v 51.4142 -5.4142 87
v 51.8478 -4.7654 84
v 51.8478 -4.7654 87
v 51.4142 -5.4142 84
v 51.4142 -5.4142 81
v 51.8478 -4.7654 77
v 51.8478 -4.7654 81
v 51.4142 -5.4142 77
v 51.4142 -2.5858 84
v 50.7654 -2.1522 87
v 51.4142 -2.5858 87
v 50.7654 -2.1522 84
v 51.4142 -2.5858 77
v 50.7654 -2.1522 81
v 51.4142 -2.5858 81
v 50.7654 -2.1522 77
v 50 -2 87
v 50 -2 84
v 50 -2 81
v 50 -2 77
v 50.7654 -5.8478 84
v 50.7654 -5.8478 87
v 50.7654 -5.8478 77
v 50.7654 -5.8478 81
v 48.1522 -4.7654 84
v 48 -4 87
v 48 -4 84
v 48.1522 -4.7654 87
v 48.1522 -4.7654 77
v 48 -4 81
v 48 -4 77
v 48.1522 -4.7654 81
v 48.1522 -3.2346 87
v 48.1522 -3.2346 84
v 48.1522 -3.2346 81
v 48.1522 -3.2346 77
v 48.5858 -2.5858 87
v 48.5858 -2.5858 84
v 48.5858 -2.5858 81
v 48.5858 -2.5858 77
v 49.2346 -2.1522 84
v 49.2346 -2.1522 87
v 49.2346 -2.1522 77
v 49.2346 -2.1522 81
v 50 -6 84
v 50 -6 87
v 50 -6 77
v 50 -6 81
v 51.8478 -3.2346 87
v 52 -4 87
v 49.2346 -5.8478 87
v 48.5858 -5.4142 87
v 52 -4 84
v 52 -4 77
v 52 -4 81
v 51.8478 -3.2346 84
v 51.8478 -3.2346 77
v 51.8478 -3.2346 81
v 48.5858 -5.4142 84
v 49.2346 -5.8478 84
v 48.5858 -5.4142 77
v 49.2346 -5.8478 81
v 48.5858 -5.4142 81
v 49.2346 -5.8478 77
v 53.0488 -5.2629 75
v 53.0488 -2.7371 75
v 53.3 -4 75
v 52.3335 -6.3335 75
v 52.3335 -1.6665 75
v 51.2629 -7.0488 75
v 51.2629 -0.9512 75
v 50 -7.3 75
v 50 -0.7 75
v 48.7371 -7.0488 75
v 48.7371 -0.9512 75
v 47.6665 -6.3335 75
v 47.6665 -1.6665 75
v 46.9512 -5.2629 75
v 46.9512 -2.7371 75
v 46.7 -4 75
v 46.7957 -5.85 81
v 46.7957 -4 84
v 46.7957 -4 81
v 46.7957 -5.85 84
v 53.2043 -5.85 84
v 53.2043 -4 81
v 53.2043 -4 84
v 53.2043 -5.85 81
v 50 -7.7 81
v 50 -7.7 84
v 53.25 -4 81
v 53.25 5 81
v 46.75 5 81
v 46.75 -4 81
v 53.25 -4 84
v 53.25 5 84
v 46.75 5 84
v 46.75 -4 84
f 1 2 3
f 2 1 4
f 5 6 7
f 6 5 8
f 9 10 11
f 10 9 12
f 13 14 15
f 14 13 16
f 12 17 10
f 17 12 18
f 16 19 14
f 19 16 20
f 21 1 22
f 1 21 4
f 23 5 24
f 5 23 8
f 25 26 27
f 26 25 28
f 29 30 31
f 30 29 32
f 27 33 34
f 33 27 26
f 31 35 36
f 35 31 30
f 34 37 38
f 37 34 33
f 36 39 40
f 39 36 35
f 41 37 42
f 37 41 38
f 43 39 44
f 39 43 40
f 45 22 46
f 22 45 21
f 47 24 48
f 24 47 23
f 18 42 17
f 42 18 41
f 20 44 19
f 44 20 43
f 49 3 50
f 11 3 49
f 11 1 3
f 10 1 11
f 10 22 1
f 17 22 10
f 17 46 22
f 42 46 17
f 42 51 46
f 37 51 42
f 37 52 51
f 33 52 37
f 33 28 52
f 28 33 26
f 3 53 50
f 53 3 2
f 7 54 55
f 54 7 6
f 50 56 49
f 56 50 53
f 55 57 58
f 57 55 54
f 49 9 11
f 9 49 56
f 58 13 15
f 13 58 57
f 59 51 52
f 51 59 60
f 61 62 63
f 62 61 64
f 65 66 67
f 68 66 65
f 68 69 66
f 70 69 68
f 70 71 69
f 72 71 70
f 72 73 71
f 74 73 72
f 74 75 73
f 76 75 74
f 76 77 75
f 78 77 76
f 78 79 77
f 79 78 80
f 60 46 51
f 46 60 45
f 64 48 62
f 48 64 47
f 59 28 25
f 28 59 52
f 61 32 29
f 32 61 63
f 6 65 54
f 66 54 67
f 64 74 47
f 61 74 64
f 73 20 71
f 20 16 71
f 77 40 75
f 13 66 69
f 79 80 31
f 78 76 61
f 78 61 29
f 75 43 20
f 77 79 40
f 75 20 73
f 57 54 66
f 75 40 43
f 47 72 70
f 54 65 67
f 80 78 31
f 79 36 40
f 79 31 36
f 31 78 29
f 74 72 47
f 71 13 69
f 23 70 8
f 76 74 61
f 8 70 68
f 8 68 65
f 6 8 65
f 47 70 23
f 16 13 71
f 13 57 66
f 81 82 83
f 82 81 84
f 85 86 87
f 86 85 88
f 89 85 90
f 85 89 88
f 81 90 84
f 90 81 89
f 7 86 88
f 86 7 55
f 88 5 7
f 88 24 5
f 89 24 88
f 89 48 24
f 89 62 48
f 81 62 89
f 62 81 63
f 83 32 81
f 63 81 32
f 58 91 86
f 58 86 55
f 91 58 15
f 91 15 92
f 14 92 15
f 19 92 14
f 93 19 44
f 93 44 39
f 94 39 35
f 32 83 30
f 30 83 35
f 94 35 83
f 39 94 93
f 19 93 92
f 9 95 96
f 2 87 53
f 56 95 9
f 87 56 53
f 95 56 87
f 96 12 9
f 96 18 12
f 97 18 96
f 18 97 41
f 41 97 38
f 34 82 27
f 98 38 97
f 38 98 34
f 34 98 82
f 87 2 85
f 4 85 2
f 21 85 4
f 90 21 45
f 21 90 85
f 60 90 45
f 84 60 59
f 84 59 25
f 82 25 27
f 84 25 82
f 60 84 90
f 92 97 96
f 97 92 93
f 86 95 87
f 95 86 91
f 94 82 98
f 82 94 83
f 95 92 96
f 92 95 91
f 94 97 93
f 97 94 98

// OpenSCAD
// file: library/dinrail_holder.scad
// din holder
include <dinrail_dim.scad> 
include <linurs_screw_dim.scad>
include <dinrail_holder_dim.scad>

use <dinrail.scad>
use <linurs_screw.scad>
use <linurs_body.scad>

module dinrail_screw(dinholder_x=100,t=0){
    for(x=[-1,1]){ 
        for(y=[-1,1]){
          translate([x*(dinholder_x+dinrail_w1)/4,
                     y*(dinholder_y-dinrail_lever_w)/2,
                     dinholder_bracket_z+dinrail_h-dinrail_screw_l/2])
          screw_fix(w=dinrail_screw_l+0.01,
                    d=dinrail_screw,
                    type=head_cnt,
                    raise=dinrail_h/2,
                    t=t);//dinholder_pass);
        }
    }// holes
    
}    
//dinrail_screw();


module dinrail_bracket(dinholder_x=100){
  echo("dinrail bracket");  
  difference(){
    translate([0,0,dinholder_bracket_z/2+dinrail_h])
    cube([dinholder_x,dinholder_y,dinholder_bracket_z],center=true);
    dinrail_screw(dinholder_x=dinholder_x,t=dinholder_pass);
  }
}
//%dinrail_bracket();

module dinrail_holder(dinholder_x=100){
  echo("dinrail holder");
  difference(){
      translate([-(dinrail_w1+dinholder_x)/4,
                 0,
                 dinrail_h-(dinholder_lever_cover+dinholder_z)/2])
      cube([(dinholder_x-dinrail_w1)/2,
             dinholder_y,
             dinholder_z+dinholder_lever_cover],
           center=true);  // main body
      dinrail_screw(dinholder_x=dinholder_x,t=dinholder_pass);
  }
  
  translate([-dinrail_w1/2,
             -dinholder_y/2,
             dinrail_h])
  rotate([0,90,90])
  linear_extrude(height=dinholder_y){
        polygon(
        points=[[dinrail_t, 0+olp],
                [dinrail_g+dinrail_t,-dinrail_g],
                [dinholder_z+dinholder_lever_cover,-dinrail_g],
                [dinholder_z+dinholder_lever_cover,0+olp],
               ], 
        paths=[[0,1,2,3]]
        ); 
  }// wedge 
}
//%dinrail_holder();

module dinrail_lever_holder(dinholder_x=100,s=2){
    echo("dinrail lever holder"); 
    difference(){
    translate([(dinrail_w1+dinholder_x)/4+dinrail_g/2,
                0,
                dinrail_h-(dinholder_z+dinholder_lever_cover)/2])
    cube([(dinholder_x-dinrail_w1)/2-dinrail_g,
           dinholder_y,
           dinholder_z+dinholder_lever_cover],
           center=true);  // main body

    translate([(dinrail_w1+dinholder_x)/4+(dinrail_g-s)/2,
                0,
                dinrail_h-(dinrail_lever_h+dinholder_pass)/2])
    cube([(dinholder_x-dinrail_w1)/2-dinrail_g-s,
           dinholder_y-2*dinholder_lever_wall+dinholder_pass,
           dinrail_lever_h+dinholder_pass+olp],center=true); // lever cut out   
       
    translate([dinholder_x/2-2*s,
                0,
                dinrail_h-(dinrail_lever_h+dinholder_pass)/2])
    cube([s+dinholder_pass,
           dinholder_y+olp,
           dinrail_lever_h+dinholder_pass+olp],
         center=true); // spring fixation cut  

    dinrail_screw(dinholder_x=dinholder_x,t=dinholder_pass); 
  }
}
//%dinrail_lever_holder();

// s strengt of spring
// t pre-tension of spring
// n number of windings
module dinrail_lever(dinholder_x=100, s=2, t=0, n=2){
    echo("dinrail lever");
     translate([dinrail_w1/2-t,
               dinrail_lever_w/2,
               dinrail_h-dinrail_lever_h  + dinrail_lever_h- dinrail_t])
    rotate([90,0,0])
    linear_extrude(height=dinrail_lever_w){
        polygon(
        points=[[0-olp,                   0                        ],
                [0-olp,                   (dinrail_t-dinrail_lever_h) ],
                [-dinrail_lever_wedge,    0                        ],
             ], 
        paths=[[0,1,2]]
        );
    }// wedge
    
    translate([dinrail_w1/2+s-dinrail_g-t,
               -dinrail_lever_w/2,
               dinrail_h-dinrail_lever_h])
    cube([dinrail_g+t+olp,dinrail_lever_w,dinrail_lever_h]);  // tension an gap cube

    translate([dinrail_w1/2+s,
               dinrail_lever_w/2,
               dinrail_h-dinrail_lever_h])
    rotate([0,0,-90])
    spring(d=[dinrail_lever_w,
              (dinholder_x-dinrail_w1)/2-2.5*s,
              dinrail_lever_h],
              s=s,n=n); // spring
    
    for(i=[-1,1]){
        translate([dinholder_x/2-2*s,
                   i*(dinholder_y-dinholder_lever_wall)/2,
                   dinrail_h-dinrail_lever_h/2])
        cube([s,dinholder_lever_wall,dinrail_lever_h],center=true);
    }// hold back the spring  
}
//dinrail_lever();

//
dinholder_x=110;
s=2;
t=2;
n=3;
// to print
//%
dinrail_bracket(dinholder_x=dinholder_x);
//rotate([180,0,0])
//%
dinrail_holder(dinholder_x=dinholder_x);
//%
dinrail_lever(dinholder_x=dinholder_x, s=s, n=n, t=t);
//%
dinrail_lever_holder(dinholder_x=dinholder_x,s=s);
//%
dinrail();
// file: library/dinrail.scad
// din rail

include <dinrail_dim.scad>
use <linurs_body.scad>

module dinrail(l=100)
{   
  translate([0,0,dinrail_t/2])
    cube([dinrail_w2-2*dinrail_r-2*dinrail_t,
          l,
          dinrail_t],center=true);
          
  for(i=[-1,1]){
    translate([i*(dinrail_w2-dinrail_t)/2,
               0,
               dinrail_h/2])
      cube([dinrail_t,l,dinrail_h-2*dinrail_r-2*dinrail_t],
           center=true);  
      
    translate([i*(dinrail_w2/2+(dinrail_w1-dinrail_w2)/4+dinrail_r/2),
               0,
               dinrail_h-dinrail_t/2])
      cube([(dinrail_w1-dinrail_w2)/2-dinrail_r,l,dinrail_t],
           center=true);
      
    translate([i*(-dinrail_w2/2+dinrail_r+dinrail_t),
               0,
               dinrail_r+dinrail_t])
      rotate([90,90+i*45,0])  
      channel(d1=dinrail_r*2,d2=(dinrail_r+dinrail_t)*2,h=l,a=90);  
      
    translate([i*(-dinrail_w2/2-dinrail_r),
               0,
               dinrail_h-dinrail_r-dinrail_t])
      rotate([90,-90+i*45,0])  
      channel(d1=dinrail_r*2,d2=(dinrail_r+dinrail_t)*2,h=l,a=90);       
  }
}

dinrail();
// file: pcbmodule/connector.scad
// connector
// Connector to be mounted on pcb of the modules
// This module is not intended to be 3D printed
include <pcbmodule_dim.scad>
include <../motherboard/motherboard_dim.scad>

use <pcb.scad>

con_w=87.5;   // width of connector bodywithout flanges of mounting holes 
con_d=2.8;    // diameter of mounting holes
con_d_w=88.9; // distance between mounting holes
con_m_h=6;    // height of mounting cube
con_h=13;     // largest z dimension

module connector(){
  echo("pcb connector");
  color("LightGrey")
  difference(){
    translate([(motherboard_w-con_w)/2,0,-pcbmodule_con_out]) // bring in position of elecbox
    union(){
      cube([con_w,motherboard_con_t,con_h]); // main body of the connector
      for(x=[(con_w-con_d_w)/2,con_w+(con_d_w-con_w)/2]){ // add the two brackets
        translate([x,con_m_h/2+pcb_thick,10.2])
        difference(){
          cube([2*con_d,con_m_h,2*con_d],center=true);  // bracket main body
          rotate([90,0,0])
          cylinder(d=con_d, h=con_h, $fn=16, center=true); // hole in brackets
        }
      }
    }
    translate([0,-olp,0])cube([motherboard_w,motherboard_t+olp,2*con_d]); // remove material to create edge of pcb
  }
}
connector();

//
pcb();
// file: pcbmodule/pcb.scad
// pcb
// pcb of the module
// This module is not intended to be 3D printed

include <../motherboard/motherboard_dim.scad>
include <pcbmodule_dim.scad>


module pcb(){
  echo("pcb");  
  color("greenyellow")
  difference(){
    cube([motherboard_w,pcb_thick,pcb_h]); // pcb
    for(x=[pcb_x1,pcb_x2]){ // mounting holes
      for(y=[pcb_y1,pcb_y2]){
        translate([x,0,y])
        rotate([90,0,0])
        cylinder(d=pcb_d,h=3*pcb_thick,center=true,$fn=16);
      }
    }
  }
}

//
pcb();
// file: pcbmodule/bracket.scad
// bracket
// A bracket of the elecbox module
// - type: 0 front bracket, 1 rear bracket
// - width 1..n in steps
// - var: 0 do not create intermediate mounting holes, 1 create intermediate mounting holes 

include <pcbmodule_dim.scad>
include <../motherboard/motherboard_dim.scad>
include <../library/linurs_screw_dim.scad>

use <../library/linurs_screw.scad>


module bracket(type=0, width=1, var=0){
  echo("bracket");  
  color("White")
  translate([type*motherboard_w,
             0,
             0])  // move mirrored bracket in position if desired
  mirror([type*1,0,0])       // mirror it if desired
  difference(){
    union(){
      for(x=[1:width]){  // create the mounting hole cubes 
        for(z=[pcb_y1,pcb_y2]){
          translate([pcb_x1,
                     (x-1)*step*var-bracket_hole_cube_h/2,
                     z])
          cube([bracket_x1-bracket_t,bracket_hole_cube_h,3*screw_d[bracket_screw]],center=true);
        }
      }

      translate([bracket_t/2+bracket_offset_x,
                 step/2*width-bracket_hole_cube_h,
                 bracket_h/2+bracket_offset_z])  
      cube([bracket_t,step*width,bracket_h],center=true);  // create the bracket front


      translate([bracket_x1/2+bracket_offset_x,
                 bracket_t/2-bracket_hole_cube_h,
                 bracket_h/2+bracket_offset_z]) 
      cube([bracket_x1,bracket_t,bracket_h],center=true);  // create the bracket mounting


      translate([bracket_x2/2+bracket_offset_x,
                 bracket_t/2-bracket_hole_cube_h+step*width-bracket_t,
                 bracket_h/2+bracket_offset_z]) 
      cube([bracket_x2,bracket_t,bracket_h],center=true);  // create the bracket mounting


    }
    for(x=[1:width]){ // create the mounting hole 
      for(z=[pcb_y1,pcb_y2]){
        translate([pcb_x1,
                   (x-1)*step*var-olp,
                   z])
        rotate([0,90,0])
        rotate([-90,0,0])
        screw_fix(w=2*bracket_hole_cube_h,d=bracket_screw,type=head_no, t=screw_t);
      }
    }
  }
}

// to show
//bracket(type=1, width=2, var=1);
//
bracket();
bracket(type=1);
//

// to print
//rotate([0,-90,0])bracket(type=0);
//rotate([0,90,0]) bracket(type=1);
//bracket(type=0);

module arduino(){
    difference(){
        bracket(type=0);
        translate([0,1+12/2,52.5+13/2])cube([20,12,13],center=true);
        translate([0,1+12/2,24+10/2])cube([20,12,10],center=true);
        translate([0,1+12+2/2,21.5+54/2])cube([20,2,54],center=true);
    }
}
//rotate([0,-90,0])
//arduino();

module 3DprinterIOfront(){
    difference(){
        bracket(type=0);
        translate([0,11/2,37.5+34/2])cube([20,11,34],center=true);        
    }
}
//rotate([0,-90,0])
//3DprinterIOfront();

module 3DprinterIOback(){
    difference(){
        translate([-100,0,0])bracket(type=1);
        translate([0,14/2,12+31/2])cube([20,14,31],center=true); 
        translate([0,14/2,53.5+18.5/2])cube([20,14,18.5],center=true);               
    }
}
//rotate([0,90,0])
//3DprinterIOback();

module Fetback(){
    difference(){
        translate([-100,0,0])bracket(type=1);
        translate([0,14/2,15+51/2])cube([20,14,51],center=true); 
       
    }
}
//rotate([0,90,0])
//Fetback();

module Stepperback(){
    difference(){
        translate([-100,0,0])bracket(type=1);
        translate([0,14/2,15+14/2])cube([20,14,14],center=true); 
        translate([0,14/2,30+14/2])cube([20,14,14],center=true); 
        translate([0,14/2,45+14/2])cube([20,14,14],center=true); 
        translate([0,14/2,60+14/2])cube([20,14,8],center=true); 
            
    }
}
//rotate([0,90,0])
//Stepperback();

module Stepperfront(){
    difference(){
        bracket(type=0);
        translate([0,14/2,15+14/2])cube([20,14,14],center=true); 
        translate([0,14/2,30+14/2])cube([20,14,14],center=true);    
       translate([0,14/2,60+14/2])cube([20,14,8],center=true);      
    }
}
//rotate([0,-90,0])
//Stepperfront();

module I2Cback(){
    difference(){
        translate([-100,0,0])bracket(type=1);
        translate([0,12/2,31+13/2])cube([20,12,13],center=true);       
    }
}
//rotate([0,90,0])
//I2Cback();

module I2Cfront(){
    difference(){
        bracket(type=0);
        translate([0,13/2,21+25/2])cube([20,13,25],center=true); 
        translate([0,5,49])rotate([0,90,0])cylinder(h=20,d=5.5,center=true, $fn=16);    
        translate([0,5,57])rotate([0,90,0])cylinder(h=20,d=5.5,center=true, $fn=16);      
    }
}
//rotate([0,-90,0])
//I2Cfront();

module MCP2221back(){
    h=12;
    w=13;
    z=31;
    difference(){
        translate([-100,0,0])bracket(type=1);
        translate([0,h/2+pcb_thick,z+w/2])cube([20,h,w],center=true);       
    }
}
//rotate([0,90,0])
//MCP2221back();

module MCP2221front(){
    h1=12;
    w1=12;
    z1=29;
    d2=4;
    h2=3;
    z2=66;
    difference(){
        bracket(type=0);
        translate([0,h1/2+pcb_thick,z1+w1/2])cube([20,h1,w1],center=true); 
        translate([0,h2+pcb_thick,z2])rotate([0,90,0])cylinder(h=20,d=d2,center=true, $fn=16);          
    }
}
//rotate([0,-90,0])
//MCP2221front();
// file: library/dinrail_dim.scad
// din rail
dinrail_w1=35;
dinrail_w2=27;
dinrail_h=7.3;
dinrail_t=1;
dinrail_r=0.5; // inner bending radius
// file: dinrail/dinrail_elecx.scad
// din rail holder for elecx 
// to check how the components interfere

include <../elecx_dim.scad>
include <../library/dinrail_dim.scad>
include <../motherboard/motherboard_dim.scad>
include <../foot/foot_dim.scad>
include <../library/dinrail_holder_dim.scad>

use <../library/dinrail.scad>
use <../library/dinrail_holder.scad>

module dinrail_elecx_single(type=0){
  if(type==0){
      dinrail_lever_l=motherboard_w-2*bracket_offset_x+2*foot_side_wall_t;
      dinrail_lever(l=dinrail_lever_l);
      dinrail_holder(l=din_bracket_l);
      dinrail_lever_holder(l=din_bracket_l);
  }else{    
    dinrail_screw(dinholder_x=dinholder_x,t=dinholder_pass);  
  }
}

module dinrail_elecx(n=1, type=0){
  if(n<din_two_holder){
  translate([50,
             (foot_min_y+(n-1)*step)/2+foot_offset_y,
             foot_offset_z-dinrail_h
            ])
  dinrail_elecx_single(type=type);
  }else{
    for(y=[foot_offset_y+dinholder_y,
           foot_min_y+(n-1)*step+foot_offset_y-dinholder_y,])  
      translate([50,
             y,
             foot_offset_z-dinrail_h
            ])
            dinrail_elecx_single(type=type);
  }
}

n=4;
//dinrail_elecx(n=n, type=1);
//
dinrail_elecx(n=n, type=0);
//foot(n=n, type=2);
//translate([50,
//             (foot_min_y+(n-1)*step)/2+foot_offset_y,
//             foot_offset_z-dinrail_h])
//dinrail(l=100+step*(n-1));
// file: pcbmodule/pcbmodule.scad
// module (pcb assembly)
// A series of assembled modules
// This module is not intended to be 3D printed
include <../motherboard/motherboard_dim.scad>

use <bracket.scad>
use <pcb.scad>
use <connector.scad>

module pcbmodule(n=1){
  for(i=[1:n]){
    translate([0,(i-1)*step,0]){
      pcb();
      connector();
      bracket();
      bracket(type=1);
    }
  }
}


//pcbmodule(n=1);
connector();
// file: library/linurs_body.scad
// linurs body
// body lets create mode advanced bodies as the standard ones from OpenSCAD as cube cylinder sphere and polyhedron

module prism(face=[[0,0],[1,0],[0,1]], h=1, center=false){  
  linear_extrude(height = h, center = center)
  polygon(points = [ face[0], face[1], face[2]], paths = [ [0, 1, 2]]);   
}
//prism();

module roundcube(size=[1,1,1], r=0.1, center=false, $fn=8){
  t = center==true ? 0 : 1; 
  translate([size[0]/2*t,size[1]/2*t,size[2]/2*t])
  union(){
    cube(size=[size[0],size[1]-2*r,size[2]-2*r],center=true);
    cube(size=[size[0]-2*r,size[1],size[2]-2*r],center=true);
    cube(size=[size[0]-2*r,size[1]-2*r,size[2]],center=true);

    for(x=[-size[0]/2+r,size[0]/2-r]){
      for(y=[-size[1]/2+r,size[1]/2-r]){
        translate([x,y,0])
          cylinder(r=r,h=size[2]-2*r, center=true,$fn=$fn);   
      }
    }

    for(x=[-size[0]/2+r,size[0]/2-r]){
      for(z=[-size[2]/2+r,size[2]/2-r]){
        translate([x,0,z])
          rotate([90,0,0])
          cylinder(r=r,h=size[1]-2*r, center=true,$fn=$fn);   
      }
    }


    for(y=[-size[1]/2+r,size[1]/2-r]){
      for(z=[-size[2]/2+r,size[2]/2-r]){
        translate([0,y,z])
          rotate([0,90,0])
          cylinder(r=r,h=size[0]-2*r, center=true,$fn=$fn);   
      }
    }

    for(x=[-size[0]/2+r,size[0]/2-r]){
      for(y=[-size[1]/2+r,size[1]/2-r]){
        for(z=[-size[2]/2+r,size[2]/2-r]){
          translate([x,y,z])
            sphere(r=r, center=true,$fn=$fn);   
        }
      }
    }
  }
}

module channel(d1=1,d2=3,h=10,a=90, center=false, $fn=32){
   intersection(){     
            difference(){
                cylinder(d=d2,h=h,center=true,$fn=$fn);
                cylinder(d=d1,h=2*h,center=true,$fn=$fn);      
            }
            if((a<180)&&(a>0)){
               t=0.5*d2*tan(a/2); 
               linear_extrude(height=2*h, center = true){
                   polygon(points=[
                                  [0,0],
                                  [d2/2,t],
                                  [d2/2,-t]
                                  ], paths=[[0,1,2]]);       
                }
            }    
            else if(a==180){
               translate([0,d2/2,0])cube([d2/2,d2,2*h]); 
            }    
   }
}

module springelement(x=0, y=0, t=1, s=2, x1=0, y1=0, a=0, l=10, m=0, e=0){
    h=1.5*s/tan(a);
    mirror([m,0,0])translate([-x,y,0]){
        rotate([0,0,180])channel(d1=2,
                d2=3*s,
                h=t,
                a=180-2*a);
        if(e==0){
                translate([x1,y1,-t/2])rotate([0,0,a])cube([l,s,t]);
        }        
    }
}    


module spring(s=2,d=[10,10,1],n=2){
//x center x
//y center y
//z tickness    
//s width of spring rods
    r1=s/2;
    r2=1.5*s;
    
    xi=d.x-3*s; // inner x circle center x
    yi=(d.y-3*s)/n/2;     // inner x circle center x
         
    c=sqrt(pow(xi,2)+pow(yi,2)); // distance between center
    c1=c/(1+r2/r1); // where spring rod cuts line between the two circle centers
    l1=sqrt(pow(c1,2)-pow(r1,2));    
    c2=c-c1;
    l2=sqrt(pow(c2,2)-pow(r2,2));
    l=l1+l2;
    a1=atan(yi/xi);
    a2=acos(r1/c1);
    a3=180-a2-a1;
    a4=90-a3;
    x1=-r1*cos(a3);
    y1=r1*sin(a3);
    
 
    translate([1.5*s,1.5*s,d.z/2]){
    for(i=[0:n-1]){
           springelement(x=0,y=i*yi*2,s=s,t=d.z, x1=x1, y1=y1, a=a4, l=l, m=0);        
    }
    for(i=[0:n-1]){
           springelement(x=xi,y=(2*i+1)*yi,s=s, t=d.z, x1=x1, y1=y1, a=a4, l=l, m=1);        
    }
    springelement(x=0,y=d.y-3*s,s=s,t=d.z, x1=x1, y1=y1, a=a4, l=l, m=0, e=1);
    }
    for(i=[0,1]){
      translate([0,i*d.y,0])mirror([0,i,0])difference(){
          cube([d.x,1.5*s,d.z]);
          translate([1.5*s,1.5*s,0])cylinder(d=s,h=3*d.z,center=true,$fn=32);
      } 
    }    
}



//
roundcube(size=[1,2,3],center=true, $fn=16);
//
translate([0,5,0])prism(h=10,center=true);
//
translate([0,10,0])channel();
//
translate([0,15,0]) spring(d=[10,30,4],n=2, s=2);
// file: library/dinrail_holder_dim.scad
// din holder
include <dinrail_dim.scad> 
include <linurs_screw_dim.scad>

// dimension for the din holder
dinholder_x=110;  // x dimension of the assembled din holder
dinholder_y=26;   // y dimension of the assembled din holder
dinholder_z=3;    // z dimension when bracket is not used
dinholder_bracket_z=dinholder_z; // z dimension of the bracket
dinrail_screw=M3; // the screws to fit it together
dinrail_screw_l=8; // lenght of the screws to fit it together

olp=0.1; // small distance used to overlap and make difference() look nice and fix mainfold errors
dinholder_pass=0.5; // gap to fit well together

// lever
dinrail_lever_w=10;
dinrail_lever_wedge=2; // overlap of wedge
dinholder_lever_wall=(dinholder_y-dinrail_lever_w)/2; // y dimension wall of lever  
dinholder_lever_cover=3;

// lever holder
dinrail_g=2; // gap to make holder larger than din rail to slide it onto the rail
dinrail_lever_h=4;
// file: elecx_dim.scad
// elecx
// The coordinate systems [0.0.0] point is the first PCB's lower right corner at the soldering side

include <library/linurs_screw_dim.scad>
include <motherboard/motherboard_dim.scad>
include <pcbmodule/pcbmodule_dim.scad>
include <wall/wall_dim.scad>

// branding text
branding="ELECX"; // As hole printable name


din_bracket_l=80;
din_two_holder=4;

// constants to look nicely and fit well together
pass_t=0.5;  //mm added so one body slides well into other
// file: motherboard/motherboard_connector.scad
// motherboard
// Connector to be mounted on the motherboard pcb
// This module is not intended to be 3D printed
// set type to 1 to get dummy conector

include <motherboard_dim.scad>
include <../library/linurs_screw_dim.scad>
use <../library/linurs_screw.scad>

module motherboard_con(type=0){
  color("LightGrey")
  difference(){
    union(){
      if(type==0){  
        cube([motherboard_con_head_w,
              motherboard_con_head_d,
              motherboard_con_h],
              center=true);  // upper body of the connector down to motherboard level
      }    
      translate([0,0,-(motherboard_con_h-motherboard_con_out)/2])
        cube([motherboard_con_w,
              motherboard_con_t,
              motherboard_con_out],
              center=true); // lower body of the connector laying on mother board
    }
    for(i=[-1,1]){ // mounting holes
      translate([i*motherboard_con_d_w/2,
                 0,
                 -(motherboard_con_h-motherboard_con_out)/2])
      screw(w=motherboard_con_out+0.1, d=M2_5, type=head_cyl, t=1);
    }
  }
}

//motherboard_con();
//
motherboard_con(type=1);
// file: wall/wall_dim.scad
include <../library/linurs_screw_dim.scad>
include <../motherboard/motherboard_dim.scad>

// wall constants
wall_t=1;        // wall thickness

wall_y=5;        // wall outside thickness
wall_fix_y=9;    // thickness of the wall fix cube
wall_gap_x=motherboard_w-2*wall_fix_y; // remove material between both wall fixation cubes
wall_head_fix_h=5; // height of the head fixing cube
wall_screw=M3;
wall_screw_t=0.8;// gap added for screws

wall_d_w=76;     // distance between wall fixation screws
wall_d_y=(wall_fix_y-wall_t)/2; // y position of the wall fixation screws
// file: pcbmodule/pcbmodule_dim.scad
include <../library/linurs_screw_dim.scad>
include <../motherboard/motherboard_dim.scad>
// pcb constants
pcb_h=80;              // height of the pcb
pcb_thick=1.6;         // thickness
pcb_x1=3;              // position mounting holes
pcb_x2=97;
pcb_y1=9;
pcb_y2=76;
pcb_d=3;               // diameter of holes

// bracket constants
bracket_t=2;           // thickness of bracket
bracket_x1=10;         // depth of the U shape at the side of the screw
bracket_x2=4;          // depth of the U shape at the side where no screw is  
bracket_h=pcb_h+15;    // height of bracket
bracket_hole_cube_h=4; // height of the mounting hole cube
bracket_screw=M2_5;    // hole for the screw

// bracket offsets
bracket_offset_x=-3;   // bracket offset in elecbox x axis (adding gap)
bracket_offset_z=-10;  // bracket offset in elecbox z axis

// pcb module dimensions
pcbmodule_w=(-bracket_offset_x)*2+motherboard_w; // depth of the module
pcbmodule_h=bracket_h;                           // hight of the module   
pcbmodule_l=step;                                // width of the module   

screw_t=1; //mm added so screws fit into holes
olp=0.1; // overlapp distance to produce nice body after difference() 
// file: head/head.scad
//head
// the head of the elecx

include <../elecx_dim.scad>
include <../library/linurs_screw_dim.scad>
include <../motherboard/motherboard_dim.scad>
include <../foot/foot_dim.scad>
include <head_dim.scad>

use <../library/linurs_body.scad>
use <../library/linurs_screw.scad>
use <../elecx_screw.scad>
use <../wall/wall.scad>

head_bracket_x=30;
head_bracket_undercut_z=2;
head_vent_x=1.5;
head_vent_y=2;
head_vent_n=5;
head_vent_start1=(motherboard_w-2*bracket_offset_x)/2+bracket_offset_x-head_bracket_x-head_groove_access_x/2;
head_vent_stop1=(motherboard_w-head_groove_access_x)/2-head_vent_x;
head_vent_start2=(motherboard_w+head_groove_access_x)/2;
head_vent_stop2=(motherboard_w-2*bracket_offset_x)/2+bracket_offset_x+head_groove_access_x/2+head_bracket_x-head_vent_x;
head_brand_y=1;
head_undercut_x=(motherboard_w-2*bracket_offset_x-head_groove_access_x-2*head_bracket_x)/2;

module head(n=1,vent=0, brand=0){
    echo("headnew");
    head_y=foot_min_y+(n-1)*step;
    difference(){
        translate([foot_offset_x,
                   foot_offset_y,
                   pcb_h+head_z]) 
        union(){// adding material
            translate([-pass_t,-pass_t,0])
            cube([foot_x+2*pass_t,
                  head_y+2*pass_t,
                  head_t]);  // head top
            
            for(i=[-pass_t,head_y-foot_side_wall_t+pass_t]){
                        translate([-pass_t,i,-head_z])
                        cube([foot_x+2*pass_t,
                              foot_side_wall_t,
                              head_z]); // y side walls
            }
                    
            foot_x_offset_wall=foot_x-foot_side_wall_t;
            for(i=[-pass_t,foot_x_offset_wall+pass_t]){
                        translate([i,-pass_t,-head_z])
                        cube([foot_side_wall_t,
                              head_y+2*pass_t,
                              head_z]); // x side walls
            }     
    
            for(i=[foot_side_wall_t,
                   foot_min_y+(n-1)*step-wall_t-foot_side_wall_t]){ 
                translate([foot_side_wall_t,
                           i-pass_t/2,
                           -head_side_wall_stand])
                cube([motherboard_w-2*bracket_offset_x+2*olp+pass_t,
                      wall_t+pass_t,
                      head_side_wall_stand]);// side wall stand
            }
            
            head_bracket_stand=head_z-(bracket_h-pcb_h+bracket_offset_z);            
            for(i=[foot_side_wall_t,
                    motherboard_w-2*bracket_offset_x-foot_side_wall_t]){
                translate([i-pass_t/2,
                           foot_side_wall_t,
                           -head_bracket_stand])                
                        
                cube([bracket_t+olp+pass_t,
                      2*wall_y+n*step+pass_t,
                      head_bracket_stand]);  // bracket stand
            }
            
            for(i=[0,
                   head_y-wall_fix_y-wall_t-foot_side_wall_t]){
                translate([(foot_x-head_groove_access_x)/2,
                           i,
                           -head_bracket_stand])                
                        
                cube([head_groove_access_x,
                      wall_fix_y+wall_t+foot_side_wall_t,
                      head_bracket_stand]);  // wall fixation cube up to braket stand
            }
            for(i=[foot_side_wall_t+wall_t,
                   head_y-wall_fix_y-foot_side_wall_t-wall_t]){
                translate([(foot_x-head_groove_access_x)/2,
                           i,
                           -head_z])                
                        
                cube([head_groove_access_x,
                      wall_fix_y,
                      head_z]);  // wall fixation cube up to head
            }
            
        }// removing material 
        wall_head_screw(t=screw_t);  
        wall_head_opposite_screw(t=screw_t);  
                
        if(vent==1){
          for(j=[0:head_vent_n]){
             for(i=[0:n-1]){
               translate([
                         (head_vent_stop1-head_vent_start1)/head_vent_n*j+head_vent_start1,
                         (foot_min_y-step)/2+foot_offset_y+i*step+head_vent_y/2,
                         head_z+pcb_h-head_t/2])
                cube([head_vent_x,
                       step-head_vent_y,
                       2*head_t]);
            }
          }
          for(j=[0:head_vent_n]){
            for(i=[0:n-1]){
               translate([
                         (head_vent_stop2-head_vent_start2)/head_vent_n*j+head_vent_start2,
                         (foot_min_y-step)/2+foot_offset_y+i*step+head_vent_y/2,
                         head_z+pcb_h-head_t/2])
               cube([head_vent_x,
                      step-head_vent_y,
                      2*head_t]);
            }
          }
        }
        
        if(brand==1){         
         translate([
        (motherboard_w-2*bracket_offset_x+2*foot_side_wall_t)/2+bracket_offset_x-foot_side_wall_t,
        (foot_min_y+(n-1)*step)/2+foot_offset_y,
        head_z/2])
         rotate([0,0,90])
         linear_extrude(height = motherboard_w ) {
         text(branding, 
             font = "Liberation Sans:style=Bold Italic",
             halign = "center",
             valign = "center",
             size=10);
         }
        }        
    }        
}

n=4;//%walls(n=n);
//%wall();
//%head(n=n, vent=1, brand=1);
//%bracket();
//%bracket(type=1);
//pcb();

//to print
//rotate([180,0,0])
//
head(n=n, vent=1, brand=1);
// file: wall/wall.scad
// walls
// walls of the elecx
include <wall_dim.scad>
include <../elecx_dim.scad>

include <../pcbmodule/pcbmodule_dim.scad>
include <../foot/foot_dim.scad>
include <../head/head_dim.scad>
include <../library/linurs_screw_dim.scad>

use <../library/linurs_body.scad>
use <../head/head.scad>
use <../foot/foot.scad>
use <../library/linurs_screw.scad>
use <../elecx_screw.scad>


wall_mirror_offset_y=step+2*(-wall_fix_y+wall_y); // y distance when the wall is mirrored

wall_vent_x=1.5;
wall_vent_n=20;
wall_vent_z=20;
wall_vent_gap=6;
wall_vent_open_z=(pcb_h-foot_side_wall_h-bracket_offset_z-wall_vent_z-2*wall_vent_gap)/2;
wall_brand_z=3;

wall_s=(motherboard_w-wall_vent_x)/(wall_vent_n-1);
wall_fix_p=(foot_step1+foot_step)/2;

module wall(vent=0, brand=1, mir=0){
  echo("wall");  
//  color("Blue")
  translate([0,
             0,
             bracket_offset_z])
  difference(){
    union(){
// add material    
      // the two front pieces  
      for(i=[0:1]){  
        translate([bracket_offset_x+i*(pcbmodule_w-bracket_x2),
                   -wall_fix_y,
                   0])
        cube([bracket_x2,wall_y,bracket_h]);
      }
      
      // the side wall
      translate([bracket_offset_x,
                 -wall_fix_y,
                 0])
       cube([pcbmodule_w,wall_t,bracket_h]); 
      
      // foot fixation cube
      translate([0,
                 -wall_fix_y,
                 -foot_step1-wall_fix_p])
      cube([motherboard_w,wall_fix_y-pass_t,foot_step1+olp]); 
  
      // foot enforcementadd material under fixation cube
      translate([0,
                 -wall_fix_y,
                 -wall_fix_p])
      rotate([90,0,90]) 
      prism(face=[[0,wall_fix_y],[wall_fix_y-pass_t,0],[0,0]], h=motherboard_w); 
  
      // head fixation cube
      translate([(motherboard_w-head_groove_access_x)/2,
                 -wall_fix_y,
                 2*pcb_h-2*bracket_offset_z-bracket_h+0.01])
      cube([head_groove_access_x,wall_fix_y-pass_t,wall_head_fix_h]); 
    }
    
// take away material 
      
    translate([0,
               0,
               -bracket_offset_z]){
      wall_foot_screw(t=screw_t);
      wall_head_screw(t=screw_t);
    }         

    // cut the foot fixation cube in two
    translate([(motherboard_w-wall_gap_x)/2,
                 wall_t-wall_fix_y,
                 -foot_step-olp-wall_fix_p])
    cube([wall_gap_x,
          wall_fix_y-wall_t+olp,
          foot_step+wall_fix_y+2*olp]); 

    // branding
    if(brand==1){  
         translate([(motherboard_w)/2-mir*(motherboard_w)/2+mir*(motherboard_w)/2,
                  (mir*-1)*motherboard_w/2,
                  bracket_h/2])
         rotate([90,0,mir*180])
         linear_extrude(height = motherboard_w ) {
         text(branding, 
             font = "Liberation Sans:style=Bold Italic",
             halign = "center",
             valign = "center",
             size=10);
         }
    }

    if(vent==1){
      for(j=[0:wall_vent_n-1]){
        for(i=[foot_side_wall_h+wall_vent_gap,
               foot_side_wall_h+wall_vent_gap+wall_vent_open_z+wall_vent_z]){

          translate([j*wall_s, 
                     -wall_fix_y-olp,
                     i])
          cube([wall_vent_x,
                wall_t+2*olp+20,
                wall_vent_open_z]);
        }
      }
    }
  }
}

module wall_opposite(n=1, vent=0, brand=0){
  translate([0,wall_mirror_offset_y+(n-1)*step,0])
  mirror([0,1,0])
  wall(vent=vent, brand=brand, mir=1);
}

module walls(n=1, vent=0, brand=1){
  wall(vent=vent, brand=brand);
  wall_opposite(n=n, vent=vent, brand=brand);
}

//walls( brand=0, vent=1);
//wall(vent=1, brand=1);
//wall_opposite(vent=1, brand=1, n=4);

//%head();
//%foot();

//to print
//rotate([90,0,0])
//
wall(vent=1, brand=1);
//rotate([-90,0,0])wall_opposite(vent=1, brand=1);
// file: foot/foot.scad
//foot
include <../elecx_dim.scad>
include <../motherboard/motherboard_dim.scad>
include <../pcbmodule/pcbmodule_dim.scad>
include <../library/dinrail_holder_dim.scad>
include <foot_dim.scad>

use <../library/linurs_body.scad>
use <../wall/wall.scad>
use <../pcbmodule/pcbmodule.scad>
use <../elecx_screw.scad>
use <../motherboard/motherboard.scad>
use <../dinrail/dinrail_elecx.scad>

module foot(n=1, type=foot_type_none){
    echo("footnew");
    foot_y=foot_min_y+(n-1)*step;
    difference(){
        union(){// adding material
            translate([foot_offset_x,
                   foot_offset_y,
                   foot_offset_z]){
            cube([foot_x,
                  foot_y,
                  foot_bottom_t]);  // the bottom
            
            for(i=[-pass_t,foot_y-foot_side_wall_t+pass_t]){
                translate([-pass_t,i,0])
                cube([foot_x+2*pass_t,
                      foot_side_wall_t,
                      foot_outer_z]); // y side walls
            }
            
            foot_x_offset_wall=foot_x-foot_side_wall_t;
            for(i=[-pass_t,foot_x_offset_wall+pass_t]){
                translate([i,-pass_t,0])
                cube([foot_side_wall_t,
                      foot_y+2*pass_t,
                      foot_outer_z]); // x side walls
            }
            
            foot_x_offset_bracket=foot_x_offset_wall-bracket_t;
            foot_x_bracket=bracket_t+foot_side_wall_t;
            for(i=[0,foot_x_offset_bracket]){
                translate([i,0,0])
                cube([foot_x_bracket,
                      foot_y,
                      foot_z]); // bracket floor
            }
            
            foot_x_offset_motherboard=foot_x_offset_wall-bracket_t-foot_motherboard_f;
            foot_x_motherboard=bracket_t+foot_side_wall_t+foot_motherboard_f;
            for(i=[0,foot_x_offset_motherboard]){
                translate([i,(foot_y-(motherboard_con_t+step*(n-1)))/2,0])
                cube([foot_x_motherboard,
                      motherboard_con_t+step*(n-1),
                      foot_z-foot_step]); // motherboard floor
            }
            
            foot_nut=10;
            foot_x_offset_nut=foot_x_offset_wall-bracket_t-foot_nut;
            foot_x_nut=bracket_t+foot_side_wall_t+foot_nut;
            for(i=[0,foot_x_offset_nut]){
                translate([i,0,0])
                cube([foot_x_nut,
                      foot_y,
                      3]); // motherboard floor
            }
      
            foot_x_wallmount=(motherboard_w-wall_gap_x)/2+foot_side_wall_t+foot_x_bracket;
            foot_x_offset_wallmount=foot_x-foot_x_wallmount;
            foot_y_offset_wallmount=foot_y-wall_fix_y;   
            for(j=[0,foot_y_offset_wallmount]){
                for(i=[0,foot_x_offset_wallmount]){
                    translate([i,j,0])
                    cube([foot_x_wallmount,
                          wall_fix_y,
                          foot_z-foot_step-foot_step1]); // wall mount floor
                }
            }
            // add material for foot fixation options 
            if(type==foot_type_bracket){  
              for(i=[foot_bracket_y/2,foot_bracket_y/2+foot_min_y-foot_bracket_y+(n-1)*step]){    
                for(j=[-foot_bracket_x/2,
                       motherboard_w+2*foot_side_wall_t-2*bracket_offset_x+foot_bracket_x/2]){                
                  translate([j,i,foot_bracket_t/2])
                    difference(){  // the brackets
                      cube([foot_bracket_x,
                            foot_bracket_y,
                            foot_bracket_t],center=true);
                      cylinder(h=foot_bracket_t+olp,d=foot_bracket_d, center=true,$fn=16);  
                    }
                }
                for(j=[0,
                       motherboard_w+2*foot_side_wall_t-2*bracket_offset_x]){
                           translate([j,i,foot_bracket_t/2+foot_bracket_t/2])
                  rotate([0,-90,90])
                   cylinder(h=foot_bracket_y,d=foot_bracket_enforce_d, center=true, $fn=3);  // enforcement of the brackets
                }
              }// mounting brackets
            }
            
        }
    }// removing material
    motherboard_screw(n=n,t=screw_t, raise=foot_outer_z/2);
    wall_foot_screw(t=screw_t);
    wall_foot_opposite_screw(t=screw_t);
    if(type==foot_type_dinrail){  // holes for din holder
           dinrail_elecx(n=n, type=1);
    }
  }  
}    

n=4;
//walls(n=n);
//pcbmodule(n=n);
//wall();

//to print
//foot(n=n, type=foot_type_none);
//translate([0,150,0])
//
foot(n=n, type=foot_type_dinrail);
//translate([0,300,0])
//foot(n=n, type=foot_type_bracket);
//motherboard_assembled(n=n, type=0);
// file: motherboard/motherboard.scad
// motherboard
// Motherboard of the elecbox
// This module is not intended to be 3D printed
include <motherboard_dim.scad>
use <motherboard_connector.scad>
use <../elecx_screw.scad>

module motherboard(n=1){
  echo("motherboard");  
  difference(){ 
    translate([0,
               0,
               -(pcbmodule_con_out+motherboard_con_out+motherboard_t)]){
      cube([motherboard_w,
            motherboard_con_t+step*(n-1),
            motherboard_t]); // the pcb
    }
    motherboard_screw(n=n,t=motherboard_pass);
  }
}

module motherboard_connectors(n=1, type=0){
  echo("motherboard connectors");  
  color("LightGrey")  
  translate([0,
             0,
             -(pcbmodule_con_out+motherboard_con_out+motherboard_t)]){
    
  for(i=[1:n]){  // add the connectors  
    translate([motherboard_w/2,
               motherboard_con_t/2+step*(i-1),
               motherboard_t+motherboard_con_h/2])
               motherboard_con(type=type);
      }
    }
}

module motherboard_assembled(n=1, type=0){
  echo("motherboard assembled");  
  motherboard(n=n);
  motherboard_connectors(n=n, type=type);  
}

n=2;

//
motherboard_assembled(n=n, type=0);

//motherboard_connectors(n=n, type=0);

//motherboard(n=n);
//motherboard(n=2, type=0);

// dummy to print out in case of n=1
//motherboard(n=1, type=1);
// file: library/linurs_screw.scad
// Metric screws and nuts 
// urs@linurs.org 2015
// It is targeted for 3D printing applications. 
// To look realistic is not the goal (Example: Nuts do not have a hole)

include <linurs_screw_dim.scad>

// Changes
//2019-02-09 split in two files
//2017-05-19 bug fix hexbolt had wrong diameter
//2017-01-22 bug fix lentgh of hex scre is outer lenght as other screw types
//2017-01-06 added hex screw
//2015-10-12 added screw_cut
//2015-11-29 screw_fix parameter sunk added, and module hex_bolt

// Consistent parameters in this file
// d screw diameter M2_5, M3, ... (enumeration with screw_d)
// t millimeters added to diameters 
//   For the screw, head, nut = 0. 
//   For the piece where the screw, nut, ... passes through = 0.5 so it slides in well

// functions used multiple times to position nuts and heads
function headh_cyl(d)=screw_cyl[d][1];  // height of cyl screw head
function headh_cnt(d)=screw_cyl[d][1];  // height of cnt screw head
function headh(d,type=head_cyl)=(type==head_cyl ? headh_cyl(d) : (type==head_cnt ? headh_cnt(d) : 0 )); // height of screw head 

function nuth(d)=screw_hex[d][2];   // height of hex nut

// head of a cylinder screw
module screw_head_cyl(d=M3, t=0)
{
  screwhd=screw_cyl[d][0]+t; // diameter of cylinder screw head
  cylinder(d=screwhd,h=headh(d=d, type=head_cyl), center=true,$fn=16); // screw head
}

// head of a countersunk screw
module screw_head_cnt(d=M3, t=0)
{
  screwd=screw_d[d]+t; 
  screwhd=screw_cnt[d][0]+t; // diameter of cylinder screw head
  cylinder(d1=screwd,d2=screwhd,h=headh(d=d,type=head_cnt), center=true,$fn=16); // screw head
}

// head of a hex screw
module screw_head_hex(d=M3, t=0)
{
    translate([0,0,-nuth(d)/2])nut(d=d, t=t);
}

// head of all screws
module screw_head(d=M3, type=head_cyl, t=0)
{ 
  if(type==head_cnt){
    screw_head_cnt(d=d, t=t);
  } else {
    if(type==head_cyl){
      screw_head_cyl(d=d, t=t);
    } else {
       if(type==head_hex){
           screw_head_hex(d=d, t=t); 
       } 
    }    
  }
}

// hex bolt 
module hex_bolt(d=M3, h=10, t=0)
{
  nutd=screw_hex[d][1]+t; // outer diameter of hex bolt
  cylinder(r=nutd/2,h=h+t, center=true,$fn=6); // nut
}

// nut 
module nut(d=M3, t=0)
{
  hex_bolt(d=d, h=nuth(d), t=t);    
}

// screw 
// w outer width of the screw = screw length + head 
module screw(w=10, d=M3, type=head_cyl, t=0){
  screwd=screw_d[d]+t;       // screw diameter
  cylinder(d=screwd, h=w, center=true,$fn=16); // screw thread length
  translate([0,0,w/2-headh(d=d,type=type)/2])
  screw_head(d=d,type=type, t=t);
}

// screw fix
// w outer width of the screw = screw length + head 
// sink additional material below to remove 
// raise additional material above to remove
module screw_fix(w=10, d=M3, type=head_cyl, sink=0, raise=0, t=0){
  screw(w=w-sink*2, d=d, type=type, t=t);
  translate([0,0,-(w-sink*2)/2+nuth(d)/2])
    nut(d=d,t=t);
  translate([0,0,-(w-sink+raise)/2])hex_bolt(d=d,h=sink+raise,t=t);    
  if(type==head_cnt){  
    translate([0,0,(w-sink+raise)/2])
    cylinder(d=screw_cnt[d][0]+t,h=sink+raise,center=true,$fn=16);
  }else{ 
    translate([0,0,(w-sink+raise)/2])
    cylinder(d=screw_cyl[d][0]+t,h=sink+raise,center=true,$fn=16);
  }     
}
//screw_fix();
//translate([10,0,0])screw_fix(sink=2,type=head_cnt);
//translate([-10,0,0])screw_fix(raise=2,type=head_cnt);

// screw cut
// material to be extracted from object to slide in a counter sunk screw for fixation
// w height of the cut out
// i depth of the screw
module screw_cut(d=M3,w=20,i=10,t=0,fn=32){
    hsh=screw_cnt[d][1];
    ws=screw_cnt[d][0]+t;
    ds=screw_d[d]+t;
    
    translate([i/2,0,-(w-hsh)/2])
      cube([i,ws,hsh],center=true);
    
    translate([0,0,-(w-hsh)/2])
      cylinder(d=ws,h=hsh,center=true,$fn=32);
    
    translate([0,0,-(w-hsh)/2+hsh])
        cylinder(d2=ds, d1=ws, h=hsh,center=true,$fn=fn);
    
    cylinder(h=w, d=ds, center=true, $fn=fn);   
    
    translate([i/2,0,0]) 
        cube([i,ds,w],center=true);
    
    for(y=[-1,1]){
        translate([i/2,y*ds/2,-w/2+hsh])
            rotate([45,0,0])
            cube([i,sqrt(2)*(ws-ds)/2,sqrt(2)*(ws-ds)/2],center=true);
    }
}
//screw_cut();

// nut cut
// material to be extracted from object to slide in a nut for fixation
// w height of the cylinder
// i lenght of the inlet
module nut_cut(w=10, wi=0, d=M3, i=10, t=0, raise=0, type=head_cyl){ 
  nut(d,t);
  translate([i/2,0,0])
    cube([i,screw_hex[d][0]+t,nuth(d)+t],center=true);
  translate([0,0,-wi])
      if(type==head_cnt){    
          screw(w=w, d=d, type=type, t=t); 
        translate([0,0,(w+raise)/2-0.01])
          cylinder(d=screw_cnt[d][0]+t,h=raise,center=true,$fn=16);
      }else{ 
          screw(w=w, d=d, type=type, t=t);   
        translate([0,0,(w+raise)/2-0.01])
          cylinder(d=screw_cyl[d][0]+t,h=raise,center=true,$fn=16);
      }       
}
//
nut_cut(raise=2,type=head_cnt,i=14,w=20,wi=2, t=1);

// present the library
show=0;

if(show==1){
    grid=20;
    
    for (j=[0:10]){
        for (i=[0:3])
           translate([j*grid,i*grid,0]){  
           
    // elements           
           if(j==0){
             screw_fix(w=(i+2)*5,d=i, type=head_cyl, t=0);
           }
       
           if(j==1){
             nut(d=i,t=0);
           } 
       
           if(j==2){   
              screw(d=i,t=0);
           } 
           
           if(j==3){   
              screw(d=i,t=0,type=head_cnt);
           } 
           
           if(j==4){   
              screw(d=i,t=0,type=head_hex);
           } 
           
           if(j==5){   
              hex_bolt(d=i,t=0);
           } 
           
       }
    }   
     
    for (j=[0:2]){
        for (i=[0:3])
           translate([j*grid,-(i+1)*grid,0]){  
             difference(){
                cube([3*screw_d[i],3*screw_d[i],(i+2)*5-0.1],center=true);    
    
                if(j==0){
                  screw_fix(w=(i+2)*5,d=i,type=head_cnt, t=0.5);
                }   
                
                if(j==1){
                  nut_cut(d=i,w=(i+2)*5);
                }
                if(j==2){
                  screw_cut(d=1,w=(i+2)*5);
                }
            
             }
           }  
        
    }
}
   
// file: head/head_dim.scad
// elecbox
include <../library/linurs_screw_dim.scad>
include <../motherboard/motherboard_dim.scad>
include <../pcbmodule/pcbmodule_dim.scad>
include <../wall/wall_dim.scad>

// head
head_free_z=6;             // free space inside head
head_t=1;                  // thickness of the head
head_z=head_free_z+head_t; // outer z dimension of head
head_side_wall_stand=head_z-(bracket_h-pcb_h+bracket_offset_z);

head_groove_z=4;
head_brand_x=2;
head_undercut=2;
head_groove_access_x=20;
// file: foot/foot_dim.scad
// elecbox
include <../library/linurs_screw_dim.scad>
include <../motherboard/motherboard_dim.scad>
include <../pcbmodule/pcbmodule_dim.scad>
include <../wall/wall_dim.scad>

// foot constants
foot_motherboard_z=8; // z distance of free space under motherboard
foot_motherboard_f=8;  // motherboard support distance
foot_side_wall_t=1;    // thickness of side wall
foot_min_y=step+2*(wall_y+foot_side_wall_t); // 1 module y dimension of the foot

foot_step=pcbmodule_con_out+motherboard_con_out+motherboard_t+bracket_offset_z; // motherboard solder side to bracket
foot_step1=foot_step; // step for the wall fixation cubes

foot_bottom_t=1;                                    // bottom thickness
foot_side_wall_h=5;                                 // height of side wall
foot_z=foot_step1+foot_motherboard_z+foot_bottom_t; // functional z dimension of foot 
foot_outer_z=foot_z+foot_side_wall_h;               // outside z dimension of foot
foot_x=motherboard_w-2*bracket_offset_x+2*foot_side_wall_t; // x dimension of foot

//foot offsets
foot_offset_x=bracket_offset_x-foot_side_wall_t; // x dimension 
foot_offset_y=-wall_fix_y-foot_side_wall_t;      // y dimension 
foot_offset_z=bracket_offset_z-foot_z;           // z dimension 

// enumerations for foot fixing variants
foot_type_none=0;
foot_type_dinrail=1;
foot_type_bracket=2;

// marking dimensions for foot_type_feed
foot_marking_in=4;
foot_marking_d=6;
foot_marking_h=0.5;

// bracket dimension for foot_type_bracket
foot_bracket_t=3;
foot_bracket_x=10;
foot_bracket_y=10;
foot_bracket_d=4;
foot_bracket_enforce_d=5;
// file: library/linurs_screw_dim.scad
// Metric screws and nuts 
// urs@linurs.org 2015

// contains dimensions of linurs_screw and can be included in other 
// OpenScad files 


// Consistent parameters in this file
// d screw diameter M2_5, M3, ... (enumeration with screw_d)
// t millimeters added to diameters 
//   For the screw, head, nut = 0. 
//   For the piece where the screw, nut, ... passes through = 0.5 so it slides in well

// enumerations of metric threads
M2_5=0;
M3=1;
M4=2;
M5=3;

// enumerations screw head type
head_cyl=0; // cylinder
head_cnt=1; // countrsunk
head_no=2;  // no head at all
head_hex=3;  // no head at all

// screw diameters
screw_d=[
2.5, // M2.5
3.0, // M3
4.0, // M4
5.0  // M5
];

// sizes for hex nuts
screw_hex=[
//   s,   e,   h
 [ 5.0, 5.8, 1.7], // M2.5
 [ 5.5, 6.4, 2.0], // M3
 [ 7.0, 8.1, 2.8], // M4
 [ 8.0, 9.2, 3.5]  // M5
];

// sizes for cylinder screw heads
screw_cyl=[
//   d,   h
 [ 4.5, 1.6], // M2.5
 [ 5.5, 2.0], // M3
 [ 7.0, 2.6], // M4
 [ 8.5, 3.3]  // M5
];

// sizes for countersunk screw heads
screw_cnt=[
//   d,   h
 [ 4.7, 1.50], // M2.5
 [ 5.6, 1.65], // M3
 [ 7.4, 2.20], // M4
 [ 9.2, 2.50]  // M5
];
// file: motherboard/motherboard_dim.scad
// motherboard pcb dimensions
motherboard_w=100;   // pcb width
motherboard_t=1.6;   // pcb thickness
motherboard_pass=0.5;// gap to fit screws 
step=25.4;           // distance between modules

// connector dimensions
motherboard_con_head_w=85;  // width of the connector head
motherboard_con_head_d=8.5; // depth of the connector head
motherboard_con_w=95;       // largest width of the connector
motherboard_con_h=11.6;     // largest height of the connector
motherboard_con_t=11;       // largest depth of the connector
motherboard_con_d_w=90;     // distance between mounting holes
motherboard_con_d=2.8;      // diameter of mounting holes
motherboard_con_out=5.2;    // height produced by the connector when pulgged in 

// pcb module connector dimension
pcbmodule_con_out=13-(5.3+2.8-2.54);  // distance connector sticks out of pcb

// offset
motherboard_z_offset= -(pcbmodule_con_out+motherboard_con_out+motherboard_t); // z offset motherboard built in
// main file
// Screws for ElecX
include <motherboard/motherboard_dim.scad>
include <library/linurs_screw_dim.scad>
include <foot/foot_dim.scad>
include <head/head_dim.scad>

use <library/linurs_screw.scad>
use <motherboard/motherboard.scad>
use <foot/foot.scad>
use <wall/wall.scad>
use <head/head.scad>

screw_motherboard_l1=12;
screw_motherboard_l2=16;
screw_motherboard_d=M2_5;
screw_wall_foot_l=20; 
wall_screw=M3;
screw_wall_head_l=12; 

module motherboard_screw(n=1,t=0, raise=0){
  echo("motherboard screw");  
    for(i=[1:n*2-1]){ // add the holes
      for(j=[-1,1]){
        if(i%2==0){  
            translate([(j*motherboard_con_d_w+motherboard_w)/2,
                        step/2*(i-1)+motherboard_con_t/2,
                        -motherboard_con_out+headh(d=screw_motherboard_d, type=head_cyl)-pcbmodule_con_out-screw_motherboard_l1/2])
            screw_fix(w=screw_motherboard_l1,d=screw_motherboard_d,type=head_cyl, t=t, raise=raise);
        }else{
            translate([(j*motherboard_con_d_w+motherboard_w)/2,
                       step/2*(i-1)+motherboard_con_t/2,
                       -pcbmodule_con_out-screw_motherboard_l2/2])
            screw_fix(w=screw_motherboard_l2,d=screw_motherboard_d,type=head_cyl, t=t, raise=raise);
        }    
      }
    }
}

module wall_foot_screw(t=0,raise=0){
    wall_fix_p=(foot_step1+foot_step)/2;
    translate([0,
             0,
             bracket_offset_z])
    for(i=[(motherboard_w-motherboard_con_d_w)/2,
              motherboard_w-(motherboard_w-motherboard_con_d_w)/2]){   
                     translate([i,
                 (wall_t-wall_fix_y)/2,                
                  foot_step1-foot_step-wall_fix_p])
  
    rotate([0,180,-90])
    nut_cut(d=wall_screw,
            w=screw_wall_foot_l,
           //   w=foot_step*4, 
            wi=screw_wall_foot_l/2-(foot_z-foot_step),      
            i=wall_fix_y/2,
            t=screw_t,
            type=head_cnt, 
            raise=foot_z/2);     
    }
}

module wall_foot_opposite_screw(t=0,raise=0){
wall_mirror_offset_y=step+2*(-wall_fix_y+wall_y);    
translate([0,wall_mirror_offset_y+(n-1)*step,0])
  mirror([0,1,0])wall_foot_screw();
}

module wall_head_screw(t=0){  
    translate([motherboard_w/2,
               (wall_t-wall_fix_y)/2,
                pcb_h+wall_head_fix_h/2])
    rotate([0,180,-90])
    nut_cut(d=wall_screw,
            w=screw_wall_head_l,
            wi=screw_wall_head_l/2-(head_z-head_side_wall_stand)/2-wall_head_fix_h,      
            i=wall_fix_y,
            t=screw_t,
            type=head_cnt);     
    
}

module wall_head_opposite_screw(t=0){
wall_mirror_offset_y=step+2*(-wall_fix_y+wall_y);    
translate([0,wall_mirror_offset_y+(n-1)*step,0])
  mirror([0,1,0])wall_head_screw();
}


n=4;

//motherboard_screw(n=n, raise=10);
//%motherboard_assembled(n=n, type=0);

//
wall_head_screw();
//wall_head_opposite_screw();

//wall_foot_screw();
//wall_foot_opposite_screw();
//%foot(n=n);
//
%wall(n=n);
//%walls(n=n);
//
%head(n=n);
